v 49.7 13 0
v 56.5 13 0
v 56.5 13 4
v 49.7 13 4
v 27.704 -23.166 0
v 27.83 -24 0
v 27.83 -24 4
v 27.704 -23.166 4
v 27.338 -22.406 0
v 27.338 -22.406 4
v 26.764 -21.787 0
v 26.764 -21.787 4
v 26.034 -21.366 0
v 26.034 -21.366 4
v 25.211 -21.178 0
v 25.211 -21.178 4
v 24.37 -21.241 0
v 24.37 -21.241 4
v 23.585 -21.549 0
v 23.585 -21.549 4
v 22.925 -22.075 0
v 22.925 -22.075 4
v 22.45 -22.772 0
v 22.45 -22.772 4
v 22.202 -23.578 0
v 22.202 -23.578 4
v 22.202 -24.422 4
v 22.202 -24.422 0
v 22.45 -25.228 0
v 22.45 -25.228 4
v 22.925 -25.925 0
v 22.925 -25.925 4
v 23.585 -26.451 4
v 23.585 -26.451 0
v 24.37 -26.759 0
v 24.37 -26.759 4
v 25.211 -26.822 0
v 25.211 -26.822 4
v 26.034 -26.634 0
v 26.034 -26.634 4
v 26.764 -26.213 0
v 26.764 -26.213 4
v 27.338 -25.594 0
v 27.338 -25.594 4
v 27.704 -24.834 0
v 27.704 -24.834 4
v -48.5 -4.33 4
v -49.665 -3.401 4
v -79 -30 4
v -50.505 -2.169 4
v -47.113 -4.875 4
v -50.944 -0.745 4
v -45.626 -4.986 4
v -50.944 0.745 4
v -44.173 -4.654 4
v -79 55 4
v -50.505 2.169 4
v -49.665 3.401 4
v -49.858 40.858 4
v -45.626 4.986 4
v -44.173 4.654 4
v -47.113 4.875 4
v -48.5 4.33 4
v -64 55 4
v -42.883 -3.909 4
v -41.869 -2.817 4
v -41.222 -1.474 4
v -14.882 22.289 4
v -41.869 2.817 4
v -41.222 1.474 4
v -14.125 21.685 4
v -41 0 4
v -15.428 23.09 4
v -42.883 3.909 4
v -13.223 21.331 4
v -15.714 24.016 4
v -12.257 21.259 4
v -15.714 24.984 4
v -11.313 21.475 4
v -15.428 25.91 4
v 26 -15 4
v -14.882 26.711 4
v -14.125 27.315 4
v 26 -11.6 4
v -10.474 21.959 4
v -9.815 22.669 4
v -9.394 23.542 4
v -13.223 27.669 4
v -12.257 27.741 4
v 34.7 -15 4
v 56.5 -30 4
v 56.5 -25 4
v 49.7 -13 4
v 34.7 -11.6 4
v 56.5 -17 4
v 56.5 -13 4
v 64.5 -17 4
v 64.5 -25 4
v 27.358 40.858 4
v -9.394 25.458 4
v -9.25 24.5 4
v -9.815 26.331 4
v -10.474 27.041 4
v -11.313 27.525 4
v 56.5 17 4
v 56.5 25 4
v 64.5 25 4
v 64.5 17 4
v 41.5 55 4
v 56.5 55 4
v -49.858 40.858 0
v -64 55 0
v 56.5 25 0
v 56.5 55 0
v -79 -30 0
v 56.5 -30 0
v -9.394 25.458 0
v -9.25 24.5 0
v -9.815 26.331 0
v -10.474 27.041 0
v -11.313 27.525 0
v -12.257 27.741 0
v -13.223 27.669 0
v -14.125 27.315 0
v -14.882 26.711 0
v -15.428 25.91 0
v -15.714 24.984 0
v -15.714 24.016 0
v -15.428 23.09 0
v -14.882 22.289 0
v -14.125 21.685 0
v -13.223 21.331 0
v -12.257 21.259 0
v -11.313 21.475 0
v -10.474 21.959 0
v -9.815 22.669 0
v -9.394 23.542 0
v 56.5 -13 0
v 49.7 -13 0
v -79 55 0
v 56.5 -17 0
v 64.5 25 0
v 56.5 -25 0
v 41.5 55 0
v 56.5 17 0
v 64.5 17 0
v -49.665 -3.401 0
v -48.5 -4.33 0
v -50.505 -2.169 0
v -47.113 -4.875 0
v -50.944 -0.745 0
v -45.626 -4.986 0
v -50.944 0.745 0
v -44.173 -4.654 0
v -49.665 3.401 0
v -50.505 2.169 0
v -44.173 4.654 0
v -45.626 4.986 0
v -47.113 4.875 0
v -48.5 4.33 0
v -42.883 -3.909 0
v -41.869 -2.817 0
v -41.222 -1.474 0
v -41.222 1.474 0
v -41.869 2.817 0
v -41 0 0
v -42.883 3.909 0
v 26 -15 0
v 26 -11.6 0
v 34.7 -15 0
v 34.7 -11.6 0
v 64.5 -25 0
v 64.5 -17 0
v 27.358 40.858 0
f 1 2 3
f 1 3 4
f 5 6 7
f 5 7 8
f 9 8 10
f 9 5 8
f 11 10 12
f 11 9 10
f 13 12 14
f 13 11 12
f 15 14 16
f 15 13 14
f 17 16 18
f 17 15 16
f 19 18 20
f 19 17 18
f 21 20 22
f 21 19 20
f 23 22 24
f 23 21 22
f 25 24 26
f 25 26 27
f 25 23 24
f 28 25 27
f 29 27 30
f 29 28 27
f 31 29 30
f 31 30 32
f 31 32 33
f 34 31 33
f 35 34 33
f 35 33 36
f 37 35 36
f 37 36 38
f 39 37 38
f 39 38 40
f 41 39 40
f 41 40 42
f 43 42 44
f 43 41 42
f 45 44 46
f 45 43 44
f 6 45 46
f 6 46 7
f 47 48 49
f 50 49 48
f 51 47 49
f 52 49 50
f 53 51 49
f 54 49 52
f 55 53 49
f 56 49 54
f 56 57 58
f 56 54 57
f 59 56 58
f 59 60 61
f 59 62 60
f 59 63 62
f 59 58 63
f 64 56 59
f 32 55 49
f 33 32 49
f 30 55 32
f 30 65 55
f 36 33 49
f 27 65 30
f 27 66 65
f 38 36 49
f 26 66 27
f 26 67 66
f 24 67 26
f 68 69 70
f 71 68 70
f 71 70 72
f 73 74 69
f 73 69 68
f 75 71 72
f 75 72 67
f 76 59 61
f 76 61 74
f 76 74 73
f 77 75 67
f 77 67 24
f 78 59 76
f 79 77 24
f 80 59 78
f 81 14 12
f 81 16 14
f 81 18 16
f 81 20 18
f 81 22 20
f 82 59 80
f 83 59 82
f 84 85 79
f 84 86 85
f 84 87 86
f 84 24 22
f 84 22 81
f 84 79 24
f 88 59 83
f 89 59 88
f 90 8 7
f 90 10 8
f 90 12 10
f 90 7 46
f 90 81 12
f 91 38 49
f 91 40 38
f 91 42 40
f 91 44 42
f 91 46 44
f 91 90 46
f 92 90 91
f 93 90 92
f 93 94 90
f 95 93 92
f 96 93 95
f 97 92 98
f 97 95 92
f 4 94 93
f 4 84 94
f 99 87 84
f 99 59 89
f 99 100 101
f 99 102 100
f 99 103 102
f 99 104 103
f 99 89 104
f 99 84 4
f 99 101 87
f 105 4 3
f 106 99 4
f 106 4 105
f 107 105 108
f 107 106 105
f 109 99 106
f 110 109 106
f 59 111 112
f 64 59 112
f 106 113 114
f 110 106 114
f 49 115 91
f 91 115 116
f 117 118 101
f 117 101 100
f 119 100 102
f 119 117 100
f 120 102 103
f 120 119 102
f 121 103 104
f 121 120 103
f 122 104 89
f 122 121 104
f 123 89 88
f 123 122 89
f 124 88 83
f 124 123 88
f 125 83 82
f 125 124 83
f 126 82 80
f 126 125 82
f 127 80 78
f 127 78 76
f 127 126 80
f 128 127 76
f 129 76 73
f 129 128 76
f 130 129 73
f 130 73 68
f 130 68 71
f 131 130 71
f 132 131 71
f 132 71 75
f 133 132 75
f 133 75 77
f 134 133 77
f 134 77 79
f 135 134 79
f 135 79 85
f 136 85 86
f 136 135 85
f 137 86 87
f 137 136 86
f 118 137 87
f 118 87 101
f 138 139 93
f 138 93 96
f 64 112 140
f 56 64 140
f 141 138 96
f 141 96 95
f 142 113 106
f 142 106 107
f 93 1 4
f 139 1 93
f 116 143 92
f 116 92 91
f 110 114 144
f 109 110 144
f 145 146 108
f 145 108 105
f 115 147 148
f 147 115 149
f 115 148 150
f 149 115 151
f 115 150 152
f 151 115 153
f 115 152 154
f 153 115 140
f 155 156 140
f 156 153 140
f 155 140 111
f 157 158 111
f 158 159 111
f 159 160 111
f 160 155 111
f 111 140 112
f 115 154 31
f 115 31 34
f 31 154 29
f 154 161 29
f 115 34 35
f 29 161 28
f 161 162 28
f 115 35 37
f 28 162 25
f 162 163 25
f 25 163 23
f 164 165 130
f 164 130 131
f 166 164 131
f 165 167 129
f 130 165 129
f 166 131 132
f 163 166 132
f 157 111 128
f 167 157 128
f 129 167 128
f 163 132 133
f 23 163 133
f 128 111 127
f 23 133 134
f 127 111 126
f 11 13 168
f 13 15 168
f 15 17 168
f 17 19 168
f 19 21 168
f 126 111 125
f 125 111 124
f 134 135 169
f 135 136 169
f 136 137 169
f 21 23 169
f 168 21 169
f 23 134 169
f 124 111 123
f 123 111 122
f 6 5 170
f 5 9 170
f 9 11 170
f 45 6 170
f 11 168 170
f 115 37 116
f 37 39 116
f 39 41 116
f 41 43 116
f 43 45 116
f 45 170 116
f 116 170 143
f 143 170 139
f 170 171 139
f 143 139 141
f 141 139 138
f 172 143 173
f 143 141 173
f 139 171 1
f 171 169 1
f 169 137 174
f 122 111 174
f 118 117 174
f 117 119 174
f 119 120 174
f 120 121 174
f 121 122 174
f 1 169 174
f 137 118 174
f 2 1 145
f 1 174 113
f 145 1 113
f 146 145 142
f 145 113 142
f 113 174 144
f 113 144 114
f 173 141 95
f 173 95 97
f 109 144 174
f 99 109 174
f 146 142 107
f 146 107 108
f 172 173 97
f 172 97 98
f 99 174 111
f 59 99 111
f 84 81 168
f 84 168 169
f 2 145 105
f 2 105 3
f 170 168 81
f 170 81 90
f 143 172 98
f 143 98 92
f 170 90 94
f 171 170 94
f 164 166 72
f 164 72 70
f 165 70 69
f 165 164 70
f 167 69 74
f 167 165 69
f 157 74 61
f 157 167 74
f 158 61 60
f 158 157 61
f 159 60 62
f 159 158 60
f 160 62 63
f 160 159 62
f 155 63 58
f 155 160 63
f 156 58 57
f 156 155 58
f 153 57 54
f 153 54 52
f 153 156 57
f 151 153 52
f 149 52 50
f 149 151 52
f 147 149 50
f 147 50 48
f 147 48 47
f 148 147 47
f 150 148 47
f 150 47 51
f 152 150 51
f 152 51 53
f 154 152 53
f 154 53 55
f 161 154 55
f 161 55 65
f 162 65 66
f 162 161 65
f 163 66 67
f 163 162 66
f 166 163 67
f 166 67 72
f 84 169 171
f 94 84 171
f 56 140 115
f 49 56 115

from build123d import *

# Parameters (mm, degrees)
SKETCH1_R           = 5
SKETCH1_R_2         = 2.83
SKETCH1_R_3         = 3.25
SKETCH1_W           = 8.7
SKETCH1_H           = 3.4
BOSS_EXTRUDE1_DEPTH = 4
BOSS_EXTRUDE2_DEPTH = 4


with BuildPart() as part:
    # Sketch1 → Boss-Extrude1 (new body)
    with BuildSketch(Plane.XY):
        Polygon((49, 30), (56.5, 30), (56.5, 25), (64.5, 25), (64.5, 17), (56.5, 17), (56.5, 13), (49.7, 13), (49.7, -13), (56.5, -13), (56.5, -17), (64.5, -17), (64.5, -25), (56.5, -25), (56.5, -30), (49, -30), (-79, -30), (-79, 30), align=None)
        with Locations((-46, 0)):
            Circle(SKETCH1_R, mode=Mode.SUBTRACT)
        with Locations((25, -24)):
            Circle(SKETCH1_R_2, mode=Mode.SUBTRACT)
        with Locations((-12.5, 24.5)):
            Circle(SKETCH1_R_3, mode=Mode.SUBTRACT)
        with Locations((30.35, -13.3)):
            Rectangle(SKETCH1_W, SKETCH1_H, mode=Mode.SUBTRACT)
    extrude(amount=BOSS_EXTRUDE1_DEPTH)

    # Sketch2 → Boss-Extrude2 (add)
    with BuildSketch(Plane.XY):
        Polygon((-79, 30), (56.5, 30), (56.5, 55), (41.5, 55), (27.357864376, 40.857864376), (-49.857864376, 40.857864376), (-64, 55), (-79, 55), align=None)
    extrude(amount=BOSS_EXTRUDE2_DEPTH)


solid = part.part
